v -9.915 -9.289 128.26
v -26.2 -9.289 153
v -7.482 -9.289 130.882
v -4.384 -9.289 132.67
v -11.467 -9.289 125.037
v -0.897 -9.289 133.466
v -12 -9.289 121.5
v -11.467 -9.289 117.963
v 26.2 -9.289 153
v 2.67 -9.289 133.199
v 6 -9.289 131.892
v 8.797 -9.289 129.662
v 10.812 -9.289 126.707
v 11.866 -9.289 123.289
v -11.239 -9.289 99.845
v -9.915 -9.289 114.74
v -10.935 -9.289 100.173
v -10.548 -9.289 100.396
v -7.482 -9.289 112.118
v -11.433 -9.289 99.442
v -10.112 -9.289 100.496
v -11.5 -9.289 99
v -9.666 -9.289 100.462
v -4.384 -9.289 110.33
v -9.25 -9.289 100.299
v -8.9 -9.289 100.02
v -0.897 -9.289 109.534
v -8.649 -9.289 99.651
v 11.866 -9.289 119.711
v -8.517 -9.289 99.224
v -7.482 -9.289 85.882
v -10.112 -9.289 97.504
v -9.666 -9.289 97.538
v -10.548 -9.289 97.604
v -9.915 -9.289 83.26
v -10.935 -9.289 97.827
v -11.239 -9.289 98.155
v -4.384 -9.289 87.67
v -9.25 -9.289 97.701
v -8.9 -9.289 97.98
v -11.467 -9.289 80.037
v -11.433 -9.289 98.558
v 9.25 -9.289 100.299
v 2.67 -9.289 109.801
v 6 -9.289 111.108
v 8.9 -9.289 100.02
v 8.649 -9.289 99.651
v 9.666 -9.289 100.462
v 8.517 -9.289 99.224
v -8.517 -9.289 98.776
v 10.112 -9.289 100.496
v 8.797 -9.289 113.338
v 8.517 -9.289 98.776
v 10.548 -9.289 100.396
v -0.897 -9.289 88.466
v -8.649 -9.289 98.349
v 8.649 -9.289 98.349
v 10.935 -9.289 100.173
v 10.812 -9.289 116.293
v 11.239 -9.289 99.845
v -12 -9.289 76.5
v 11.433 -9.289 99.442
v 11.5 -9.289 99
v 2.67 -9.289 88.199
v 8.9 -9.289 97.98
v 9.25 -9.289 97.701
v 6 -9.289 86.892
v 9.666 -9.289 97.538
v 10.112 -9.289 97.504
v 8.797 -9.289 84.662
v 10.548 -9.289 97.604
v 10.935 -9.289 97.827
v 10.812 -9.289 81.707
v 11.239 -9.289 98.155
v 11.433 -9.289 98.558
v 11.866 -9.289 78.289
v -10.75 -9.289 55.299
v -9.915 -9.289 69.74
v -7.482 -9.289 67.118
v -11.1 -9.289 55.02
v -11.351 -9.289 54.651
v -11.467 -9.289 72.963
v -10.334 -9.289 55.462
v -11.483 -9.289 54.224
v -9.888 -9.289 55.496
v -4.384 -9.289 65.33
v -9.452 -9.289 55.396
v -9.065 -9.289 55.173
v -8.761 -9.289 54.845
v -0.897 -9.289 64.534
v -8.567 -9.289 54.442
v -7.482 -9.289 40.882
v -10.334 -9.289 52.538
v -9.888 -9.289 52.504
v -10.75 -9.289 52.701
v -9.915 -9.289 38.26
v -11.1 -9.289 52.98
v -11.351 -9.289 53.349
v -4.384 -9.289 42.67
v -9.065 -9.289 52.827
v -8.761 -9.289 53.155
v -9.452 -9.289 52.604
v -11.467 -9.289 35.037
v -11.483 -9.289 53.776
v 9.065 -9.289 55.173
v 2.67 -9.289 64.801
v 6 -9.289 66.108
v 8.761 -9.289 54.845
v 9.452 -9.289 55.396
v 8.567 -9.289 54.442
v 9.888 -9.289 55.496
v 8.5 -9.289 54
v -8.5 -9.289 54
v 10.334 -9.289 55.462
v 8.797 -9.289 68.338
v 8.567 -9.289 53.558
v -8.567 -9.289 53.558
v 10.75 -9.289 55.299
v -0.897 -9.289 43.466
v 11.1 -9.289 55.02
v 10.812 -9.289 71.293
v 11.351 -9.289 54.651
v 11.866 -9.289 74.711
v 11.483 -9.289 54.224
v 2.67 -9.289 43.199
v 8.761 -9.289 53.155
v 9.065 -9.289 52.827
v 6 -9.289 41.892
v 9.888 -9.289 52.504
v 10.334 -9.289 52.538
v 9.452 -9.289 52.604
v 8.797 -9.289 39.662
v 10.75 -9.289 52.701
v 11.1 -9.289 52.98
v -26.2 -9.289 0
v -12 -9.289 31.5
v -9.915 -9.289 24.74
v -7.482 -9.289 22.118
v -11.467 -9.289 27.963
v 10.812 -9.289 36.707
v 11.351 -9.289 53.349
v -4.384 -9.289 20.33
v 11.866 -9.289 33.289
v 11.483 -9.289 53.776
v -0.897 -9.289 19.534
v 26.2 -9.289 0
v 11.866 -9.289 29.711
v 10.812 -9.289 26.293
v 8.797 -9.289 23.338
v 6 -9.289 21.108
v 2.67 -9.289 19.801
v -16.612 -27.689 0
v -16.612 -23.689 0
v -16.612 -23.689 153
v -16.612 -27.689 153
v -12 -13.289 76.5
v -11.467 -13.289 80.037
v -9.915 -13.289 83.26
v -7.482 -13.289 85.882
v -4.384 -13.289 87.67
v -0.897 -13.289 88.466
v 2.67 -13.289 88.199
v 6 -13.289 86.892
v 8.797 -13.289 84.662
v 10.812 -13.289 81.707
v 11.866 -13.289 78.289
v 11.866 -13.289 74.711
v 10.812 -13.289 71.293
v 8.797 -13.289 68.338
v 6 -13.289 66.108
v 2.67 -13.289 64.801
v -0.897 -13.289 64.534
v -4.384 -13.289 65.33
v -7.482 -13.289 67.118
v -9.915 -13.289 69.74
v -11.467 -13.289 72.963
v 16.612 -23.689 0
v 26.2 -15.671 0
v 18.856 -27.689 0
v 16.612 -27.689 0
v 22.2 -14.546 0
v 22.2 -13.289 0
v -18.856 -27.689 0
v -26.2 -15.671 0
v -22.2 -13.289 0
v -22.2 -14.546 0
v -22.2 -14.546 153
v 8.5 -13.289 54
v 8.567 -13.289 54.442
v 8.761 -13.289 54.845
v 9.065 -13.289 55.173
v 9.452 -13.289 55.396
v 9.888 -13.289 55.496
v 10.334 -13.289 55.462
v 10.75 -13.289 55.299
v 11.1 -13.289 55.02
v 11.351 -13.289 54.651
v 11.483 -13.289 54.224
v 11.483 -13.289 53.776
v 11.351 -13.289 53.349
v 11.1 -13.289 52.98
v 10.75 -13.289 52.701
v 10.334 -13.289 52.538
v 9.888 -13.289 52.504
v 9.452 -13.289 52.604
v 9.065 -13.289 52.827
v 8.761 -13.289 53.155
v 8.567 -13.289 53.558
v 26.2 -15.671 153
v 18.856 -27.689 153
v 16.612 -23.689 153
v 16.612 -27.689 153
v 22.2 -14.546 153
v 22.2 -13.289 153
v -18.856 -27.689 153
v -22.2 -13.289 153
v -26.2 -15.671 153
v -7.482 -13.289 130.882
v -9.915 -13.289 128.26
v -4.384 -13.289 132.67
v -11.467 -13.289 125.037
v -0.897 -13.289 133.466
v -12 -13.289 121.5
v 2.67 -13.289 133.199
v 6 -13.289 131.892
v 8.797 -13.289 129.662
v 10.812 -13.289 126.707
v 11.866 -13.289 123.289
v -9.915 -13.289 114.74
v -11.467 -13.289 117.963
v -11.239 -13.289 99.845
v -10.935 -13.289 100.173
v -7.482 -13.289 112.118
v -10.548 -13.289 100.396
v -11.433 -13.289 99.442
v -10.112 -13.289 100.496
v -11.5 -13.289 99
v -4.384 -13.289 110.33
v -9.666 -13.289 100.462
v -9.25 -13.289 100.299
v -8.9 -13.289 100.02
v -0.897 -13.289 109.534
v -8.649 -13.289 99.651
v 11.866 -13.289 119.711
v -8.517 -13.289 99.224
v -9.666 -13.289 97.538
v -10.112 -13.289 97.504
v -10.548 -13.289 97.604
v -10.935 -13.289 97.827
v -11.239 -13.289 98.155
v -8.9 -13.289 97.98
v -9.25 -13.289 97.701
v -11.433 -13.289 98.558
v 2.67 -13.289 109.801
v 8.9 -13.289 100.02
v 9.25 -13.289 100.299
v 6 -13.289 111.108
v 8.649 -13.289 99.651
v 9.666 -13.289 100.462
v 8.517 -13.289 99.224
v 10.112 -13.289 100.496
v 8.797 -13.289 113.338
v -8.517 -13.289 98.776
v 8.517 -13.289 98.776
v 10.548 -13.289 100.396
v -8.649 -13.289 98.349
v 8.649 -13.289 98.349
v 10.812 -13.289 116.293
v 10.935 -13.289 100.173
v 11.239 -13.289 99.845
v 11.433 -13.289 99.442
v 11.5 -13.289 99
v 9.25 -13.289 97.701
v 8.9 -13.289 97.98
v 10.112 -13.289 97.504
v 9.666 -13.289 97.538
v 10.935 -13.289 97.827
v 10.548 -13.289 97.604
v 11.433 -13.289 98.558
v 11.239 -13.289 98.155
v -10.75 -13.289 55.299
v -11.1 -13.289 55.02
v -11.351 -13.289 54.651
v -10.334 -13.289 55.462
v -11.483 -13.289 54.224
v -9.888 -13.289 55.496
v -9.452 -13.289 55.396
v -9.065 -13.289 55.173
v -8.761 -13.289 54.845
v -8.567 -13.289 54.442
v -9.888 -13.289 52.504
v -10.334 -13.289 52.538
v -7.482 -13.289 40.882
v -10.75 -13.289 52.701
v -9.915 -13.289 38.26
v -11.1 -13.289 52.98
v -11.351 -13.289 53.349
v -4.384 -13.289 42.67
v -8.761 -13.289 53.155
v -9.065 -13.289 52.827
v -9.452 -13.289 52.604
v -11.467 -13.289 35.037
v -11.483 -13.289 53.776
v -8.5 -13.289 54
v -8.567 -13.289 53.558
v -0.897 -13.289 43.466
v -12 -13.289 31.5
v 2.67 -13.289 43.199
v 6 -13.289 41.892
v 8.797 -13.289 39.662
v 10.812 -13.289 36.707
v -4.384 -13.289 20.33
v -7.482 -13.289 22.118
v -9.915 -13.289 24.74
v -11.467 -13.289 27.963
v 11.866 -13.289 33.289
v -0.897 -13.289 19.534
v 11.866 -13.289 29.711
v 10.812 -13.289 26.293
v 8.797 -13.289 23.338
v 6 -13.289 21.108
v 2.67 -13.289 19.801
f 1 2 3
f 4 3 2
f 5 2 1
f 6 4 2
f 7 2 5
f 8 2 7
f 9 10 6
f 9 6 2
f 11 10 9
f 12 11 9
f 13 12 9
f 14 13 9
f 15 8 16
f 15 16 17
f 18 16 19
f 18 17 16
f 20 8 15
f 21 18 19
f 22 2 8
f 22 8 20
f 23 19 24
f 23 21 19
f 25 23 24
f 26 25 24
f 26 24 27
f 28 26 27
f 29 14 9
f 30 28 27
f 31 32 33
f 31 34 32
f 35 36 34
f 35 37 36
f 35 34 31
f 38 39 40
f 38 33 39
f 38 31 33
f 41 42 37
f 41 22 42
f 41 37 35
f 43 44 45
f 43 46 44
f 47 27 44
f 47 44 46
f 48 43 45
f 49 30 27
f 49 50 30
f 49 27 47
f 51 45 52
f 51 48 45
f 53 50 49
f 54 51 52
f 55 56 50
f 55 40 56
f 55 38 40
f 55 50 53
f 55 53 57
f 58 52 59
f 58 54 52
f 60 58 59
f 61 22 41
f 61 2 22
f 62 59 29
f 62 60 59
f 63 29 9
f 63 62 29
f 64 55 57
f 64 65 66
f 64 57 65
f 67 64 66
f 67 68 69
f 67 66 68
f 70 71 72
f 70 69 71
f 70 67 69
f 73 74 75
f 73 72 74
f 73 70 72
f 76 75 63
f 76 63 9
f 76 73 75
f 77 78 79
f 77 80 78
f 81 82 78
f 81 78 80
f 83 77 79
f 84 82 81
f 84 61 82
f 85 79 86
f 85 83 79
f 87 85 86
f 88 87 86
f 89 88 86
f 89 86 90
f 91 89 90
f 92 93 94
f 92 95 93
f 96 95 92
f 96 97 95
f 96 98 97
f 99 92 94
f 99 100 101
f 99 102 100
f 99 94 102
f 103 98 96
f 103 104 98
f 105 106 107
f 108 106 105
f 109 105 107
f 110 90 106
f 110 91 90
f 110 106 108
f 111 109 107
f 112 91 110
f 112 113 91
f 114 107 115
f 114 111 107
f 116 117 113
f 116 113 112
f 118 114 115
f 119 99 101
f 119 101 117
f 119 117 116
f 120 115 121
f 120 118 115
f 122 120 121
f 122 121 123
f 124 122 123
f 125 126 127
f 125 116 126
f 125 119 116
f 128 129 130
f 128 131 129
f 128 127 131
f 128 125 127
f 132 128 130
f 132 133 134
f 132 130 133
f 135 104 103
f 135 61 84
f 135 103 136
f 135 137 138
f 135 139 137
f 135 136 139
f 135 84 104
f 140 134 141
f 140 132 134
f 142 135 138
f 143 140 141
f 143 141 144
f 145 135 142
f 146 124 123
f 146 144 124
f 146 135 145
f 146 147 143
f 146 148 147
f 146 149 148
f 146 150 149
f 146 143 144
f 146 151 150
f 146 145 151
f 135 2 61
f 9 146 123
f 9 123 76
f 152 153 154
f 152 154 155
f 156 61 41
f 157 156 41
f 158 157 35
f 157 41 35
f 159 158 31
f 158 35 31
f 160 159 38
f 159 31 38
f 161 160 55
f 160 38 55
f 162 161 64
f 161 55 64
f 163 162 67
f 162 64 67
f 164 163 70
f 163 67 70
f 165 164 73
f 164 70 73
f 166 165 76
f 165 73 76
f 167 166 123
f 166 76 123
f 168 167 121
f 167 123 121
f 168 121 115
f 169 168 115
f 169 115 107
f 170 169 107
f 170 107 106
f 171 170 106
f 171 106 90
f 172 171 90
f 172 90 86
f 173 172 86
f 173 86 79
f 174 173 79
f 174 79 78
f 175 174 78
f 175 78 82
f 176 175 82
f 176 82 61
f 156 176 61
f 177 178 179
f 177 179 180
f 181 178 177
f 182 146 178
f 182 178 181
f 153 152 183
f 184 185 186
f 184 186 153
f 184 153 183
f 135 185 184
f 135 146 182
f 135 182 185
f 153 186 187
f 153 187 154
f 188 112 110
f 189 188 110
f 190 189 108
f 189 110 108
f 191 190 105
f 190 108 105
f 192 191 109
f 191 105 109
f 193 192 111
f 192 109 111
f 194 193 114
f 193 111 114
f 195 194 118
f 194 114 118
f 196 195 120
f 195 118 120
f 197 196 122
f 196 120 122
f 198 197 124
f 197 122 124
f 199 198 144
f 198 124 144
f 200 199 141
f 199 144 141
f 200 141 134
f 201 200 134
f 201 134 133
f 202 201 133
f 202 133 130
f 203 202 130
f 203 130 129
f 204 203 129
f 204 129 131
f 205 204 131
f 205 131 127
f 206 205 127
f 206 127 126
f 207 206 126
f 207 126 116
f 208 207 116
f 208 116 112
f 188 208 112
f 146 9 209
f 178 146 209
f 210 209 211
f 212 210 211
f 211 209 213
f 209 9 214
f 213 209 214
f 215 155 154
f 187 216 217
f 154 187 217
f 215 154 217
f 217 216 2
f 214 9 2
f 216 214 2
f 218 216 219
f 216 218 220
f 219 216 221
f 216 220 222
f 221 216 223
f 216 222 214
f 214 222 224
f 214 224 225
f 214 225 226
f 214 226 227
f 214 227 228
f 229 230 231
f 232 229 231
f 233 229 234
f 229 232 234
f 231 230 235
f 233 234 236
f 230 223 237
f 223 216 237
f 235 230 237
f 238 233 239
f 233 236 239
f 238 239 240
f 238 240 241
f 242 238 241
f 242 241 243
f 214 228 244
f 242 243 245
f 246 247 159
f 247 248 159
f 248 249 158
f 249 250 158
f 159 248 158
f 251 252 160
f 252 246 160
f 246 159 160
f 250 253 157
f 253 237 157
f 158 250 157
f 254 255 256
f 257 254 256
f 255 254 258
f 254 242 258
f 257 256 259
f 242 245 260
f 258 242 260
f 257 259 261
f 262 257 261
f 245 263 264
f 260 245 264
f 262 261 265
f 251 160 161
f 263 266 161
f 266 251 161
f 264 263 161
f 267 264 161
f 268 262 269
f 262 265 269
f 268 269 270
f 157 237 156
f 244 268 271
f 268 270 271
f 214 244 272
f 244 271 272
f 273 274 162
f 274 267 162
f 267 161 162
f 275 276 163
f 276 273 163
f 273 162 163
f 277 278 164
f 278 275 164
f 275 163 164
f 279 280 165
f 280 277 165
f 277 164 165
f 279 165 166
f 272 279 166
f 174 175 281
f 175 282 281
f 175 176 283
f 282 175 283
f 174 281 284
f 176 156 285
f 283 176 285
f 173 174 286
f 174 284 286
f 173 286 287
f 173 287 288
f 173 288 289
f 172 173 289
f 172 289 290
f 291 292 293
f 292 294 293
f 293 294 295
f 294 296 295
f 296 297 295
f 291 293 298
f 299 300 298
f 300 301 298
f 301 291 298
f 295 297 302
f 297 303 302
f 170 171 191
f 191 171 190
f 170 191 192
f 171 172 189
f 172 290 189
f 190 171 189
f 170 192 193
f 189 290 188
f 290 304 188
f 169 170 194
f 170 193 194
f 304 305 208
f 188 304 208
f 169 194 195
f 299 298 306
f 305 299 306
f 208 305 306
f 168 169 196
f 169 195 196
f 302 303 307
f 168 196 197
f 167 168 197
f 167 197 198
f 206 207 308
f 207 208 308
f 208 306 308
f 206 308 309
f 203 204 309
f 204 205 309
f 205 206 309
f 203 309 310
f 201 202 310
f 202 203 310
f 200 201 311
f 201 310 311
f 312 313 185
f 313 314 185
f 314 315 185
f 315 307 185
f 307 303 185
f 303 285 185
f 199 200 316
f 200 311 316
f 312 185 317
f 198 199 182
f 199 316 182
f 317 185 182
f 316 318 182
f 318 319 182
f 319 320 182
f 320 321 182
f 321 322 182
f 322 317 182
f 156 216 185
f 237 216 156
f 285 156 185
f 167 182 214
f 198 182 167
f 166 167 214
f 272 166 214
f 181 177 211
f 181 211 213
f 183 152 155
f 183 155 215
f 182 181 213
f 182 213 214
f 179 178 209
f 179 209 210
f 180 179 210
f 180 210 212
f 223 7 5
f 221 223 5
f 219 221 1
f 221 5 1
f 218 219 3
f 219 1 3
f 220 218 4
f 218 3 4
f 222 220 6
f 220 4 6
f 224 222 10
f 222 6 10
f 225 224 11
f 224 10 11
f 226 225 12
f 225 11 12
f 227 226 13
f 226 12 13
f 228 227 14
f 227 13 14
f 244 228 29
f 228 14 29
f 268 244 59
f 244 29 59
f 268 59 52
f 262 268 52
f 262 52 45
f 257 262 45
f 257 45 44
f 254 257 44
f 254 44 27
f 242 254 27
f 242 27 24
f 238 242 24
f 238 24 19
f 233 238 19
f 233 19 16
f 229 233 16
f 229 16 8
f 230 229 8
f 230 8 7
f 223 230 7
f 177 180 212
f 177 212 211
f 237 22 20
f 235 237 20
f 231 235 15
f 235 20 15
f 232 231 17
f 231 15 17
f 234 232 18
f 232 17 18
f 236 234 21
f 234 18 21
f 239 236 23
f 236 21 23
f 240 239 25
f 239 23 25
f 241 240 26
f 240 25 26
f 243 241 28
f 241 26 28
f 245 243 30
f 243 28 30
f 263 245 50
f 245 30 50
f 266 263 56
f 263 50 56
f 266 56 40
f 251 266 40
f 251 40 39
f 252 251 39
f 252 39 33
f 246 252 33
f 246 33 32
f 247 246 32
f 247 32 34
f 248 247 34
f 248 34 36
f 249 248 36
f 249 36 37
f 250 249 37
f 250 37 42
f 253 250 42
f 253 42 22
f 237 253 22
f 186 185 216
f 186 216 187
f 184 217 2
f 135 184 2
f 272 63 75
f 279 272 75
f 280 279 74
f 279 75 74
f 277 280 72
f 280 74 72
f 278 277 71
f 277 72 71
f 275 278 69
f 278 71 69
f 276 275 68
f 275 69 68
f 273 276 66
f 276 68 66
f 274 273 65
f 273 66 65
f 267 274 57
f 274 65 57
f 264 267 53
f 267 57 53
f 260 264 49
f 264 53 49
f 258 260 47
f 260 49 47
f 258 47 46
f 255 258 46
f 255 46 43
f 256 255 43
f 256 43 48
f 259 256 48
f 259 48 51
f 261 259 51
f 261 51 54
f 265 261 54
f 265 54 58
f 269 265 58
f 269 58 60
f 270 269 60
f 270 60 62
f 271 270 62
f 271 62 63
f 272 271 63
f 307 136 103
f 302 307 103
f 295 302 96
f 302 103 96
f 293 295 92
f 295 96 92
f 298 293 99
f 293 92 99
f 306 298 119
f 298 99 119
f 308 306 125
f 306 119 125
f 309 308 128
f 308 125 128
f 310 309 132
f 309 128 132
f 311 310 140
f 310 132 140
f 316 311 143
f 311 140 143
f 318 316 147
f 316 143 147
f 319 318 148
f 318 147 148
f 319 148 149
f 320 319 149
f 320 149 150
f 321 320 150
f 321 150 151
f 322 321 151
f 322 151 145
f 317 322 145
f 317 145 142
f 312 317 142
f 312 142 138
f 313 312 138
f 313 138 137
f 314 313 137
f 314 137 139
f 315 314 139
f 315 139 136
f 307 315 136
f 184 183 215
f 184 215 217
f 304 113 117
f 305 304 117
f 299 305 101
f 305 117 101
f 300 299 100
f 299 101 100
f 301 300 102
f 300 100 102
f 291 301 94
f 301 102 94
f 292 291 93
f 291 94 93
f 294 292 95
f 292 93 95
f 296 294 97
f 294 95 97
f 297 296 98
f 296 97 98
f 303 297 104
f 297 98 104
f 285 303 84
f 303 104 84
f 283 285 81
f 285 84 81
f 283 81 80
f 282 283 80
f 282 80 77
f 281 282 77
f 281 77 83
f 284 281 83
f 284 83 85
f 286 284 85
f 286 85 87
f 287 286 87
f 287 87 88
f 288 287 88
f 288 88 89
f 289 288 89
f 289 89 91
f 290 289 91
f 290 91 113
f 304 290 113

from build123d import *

# Parameters (mm, degrees)
BOSS_EXTRUDE1_DEPTH = 153
SKETCH2_R           = 12
CUT_EXTRUDE1_DEPTH  = 213
SKETCH3_R           = 1.5
CUT_EXTRUDE2_DEPTH  = 10


with BuildPart() as part:
    # Sketch1 → Boss-Extrude1 (new body)
    with BuildSketch(Plane.XY):
        Polygon((0, -13.289354466), (-22.2, -13.289354466), (-22.2, -14.545627613), (-16.612166923, -23.689354466), (-16.612166923, -27.689354466), (-18.855505392, -27.689354466), (-26.2, -15.671090562), (-26.2, -9.289354466), (26.2, -9.289354466), (26.2, -15.671090562), (18.855505392, -27.689354466), (16.612166923, -27.689354466), (16.612166923, -23.689354466), (22.2, -14.545627613), (22.2, -13.289354466), align=None)
    extrude(amount=BOSS_EXTRUDE1_DEPTH)

    # Sketch2 → Cut-Extrude1 (cut)
    with BuildSketch(Plane(origin=(0, -9.289354466, 0), x_dir=(1, 0, 0), z_dir=(0, 1, 0))):
        with Locations(Location((0, -31.5, 0), (0, 0, 180))):
            Circle(SKETCH2_R)
        with Locations(Location((0, -76.5, 0), (0, 0, 180))):
            Circle(SKETCH2_R)
        with Locations(Location((0, -121.5, 0), (0, 0, 180))):
            Circle(SKETCH2_R)
    extrude(amount=-CUT_EXTRUDE1_DEPTH, mode=Mode.SUBTRACT)

    # Sketch3 → Cut-Extrude2 (cut)
    with BuildSketch(Plane(origin=(0, -9.289354466, 0), x_dir=(1, 0, 0), z_dir=(0, 1, 0))):
        with Locations(Location((-10, -99, 0), (0, 0, 180))):
            Circle(SKETCH3_R)
        with Locations((10, -99)):
            Circle(SKETCH3_R)
        with Locations(Location((10, -54, 0), (0, 0, 180))):
            Circle(SKETCH3_R)
        with Locations((-10, -54)):
            Circle(SKETCH3_R)
    extrude(amount=-CUT_EXTRUDE2_DEPTH, mode=Mode.SUBTRACT)


solid = part.part
